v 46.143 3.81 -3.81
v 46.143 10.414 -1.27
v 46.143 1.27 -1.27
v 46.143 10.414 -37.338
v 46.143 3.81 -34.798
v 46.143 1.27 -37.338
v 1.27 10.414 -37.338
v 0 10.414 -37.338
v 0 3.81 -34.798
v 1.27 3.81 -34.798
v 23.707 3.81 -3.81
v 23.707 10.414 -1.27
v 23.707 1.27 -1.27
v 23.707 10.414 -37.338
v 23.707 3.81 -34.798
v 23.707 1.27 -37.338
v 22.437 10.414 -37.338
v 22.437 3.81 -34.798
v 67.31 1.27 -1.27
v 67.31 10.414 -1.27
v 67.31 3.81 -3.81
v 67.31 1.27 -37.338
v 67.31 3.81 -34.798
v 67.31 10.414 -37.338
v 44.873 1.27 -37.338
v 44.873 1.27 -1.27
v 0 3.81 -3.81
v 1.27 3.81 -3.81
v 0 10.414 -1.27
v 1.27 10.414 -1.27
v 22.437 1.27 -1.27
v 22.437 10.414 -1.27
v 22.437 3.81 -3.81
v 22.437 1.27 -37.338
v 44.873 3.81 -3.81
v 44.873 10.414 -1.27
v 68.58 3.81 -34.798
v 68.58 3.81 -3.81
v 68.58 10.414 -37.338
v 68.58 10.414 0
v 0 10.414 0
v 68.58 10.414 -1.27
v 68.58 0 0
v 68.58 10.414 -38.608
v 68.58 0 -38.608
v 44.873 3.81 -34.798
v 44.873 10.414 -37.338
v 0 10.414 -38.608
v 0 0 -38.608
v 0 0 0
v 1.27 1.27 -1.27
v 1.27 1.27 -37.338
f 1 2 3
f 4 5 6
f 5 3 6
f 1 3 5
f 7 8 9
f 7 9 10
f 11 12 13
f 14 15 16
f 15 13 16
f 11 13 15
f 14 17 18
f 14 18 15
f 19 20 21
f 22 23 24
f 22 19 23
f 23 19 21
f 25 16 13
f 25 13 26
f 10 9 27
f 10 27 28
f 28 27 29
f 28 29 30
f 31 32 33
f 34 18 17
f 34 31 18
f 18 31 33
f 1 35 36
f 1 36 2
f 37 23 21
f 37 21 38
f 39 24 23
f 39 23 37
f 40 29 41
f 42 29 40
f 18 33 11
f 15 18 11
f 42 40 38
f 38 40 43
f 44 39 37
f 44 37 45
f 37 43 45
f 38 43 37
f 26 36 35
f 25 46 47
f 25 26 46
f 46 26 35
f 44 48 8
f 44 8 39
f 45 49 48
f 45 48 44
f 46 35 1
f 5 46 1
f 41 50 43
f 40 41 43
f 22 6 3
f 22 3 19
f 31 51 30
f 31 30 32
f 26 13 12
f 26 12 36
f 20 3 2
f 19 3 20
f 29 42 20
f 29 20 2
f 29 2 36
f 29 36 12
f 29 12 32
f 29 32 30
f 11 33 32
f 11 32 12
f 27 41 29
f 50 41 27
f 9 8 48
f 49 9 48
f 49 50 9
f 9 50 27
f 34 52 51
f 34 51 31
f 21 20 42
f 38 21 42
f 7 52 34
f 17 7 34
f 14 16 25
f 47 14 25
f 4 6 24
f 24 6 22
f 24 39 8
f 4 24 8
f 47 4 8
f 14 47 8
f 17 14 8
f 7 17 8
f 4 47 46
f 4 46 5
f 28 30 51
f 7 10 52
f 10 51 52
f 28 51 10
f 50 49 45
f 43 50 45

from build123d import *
from OCP.BRepFilletAPI import BRepFilletAPI_MakeChamfer

# Parameters (mm, degrees)
SKETCH1_W           = 68.58
SKETCH1_H           = 38.608
BOSS_EXTRUDE1_DEPTH = 1.27
SKETCH2_W           = 68.58
SKETCH2_H           = 1.27
BOSS_EXTRUDE2_DEPTH = 9.144
SKETCH4_W           = 1.27
SKETCH4_H           = 36.068
BOSS_EXTRUDE4_DEPTH = 2.54
CHAMFER2_SIZE       = 6.604
CHAMFER2_SIZE_2     = 2.540000001


with BuildPart() as part:
    # Sketch1 → Boss-Extrude1 (new body)
    with BuildSketch(Plane(origin=(0, 0, 0), x_dir=(1, 0, 0), z_dir=(0, 1, 0))):
        with Locations((34.29, 19.304)):
            Rectangle(SKETCH1_W, SKETCH1_H)
    extrude(amount=BOSS_EXTRUDE1_DEPTH)

    # Sketch2 → Boss-Extrude2 (add)
    with BuildSketch(Plane(origin=(0, 1.27, 0), x_dir=(1, 0, 0), z_dir=(0, 1, 0))):
        with Locations((34.29, 37.973)):
            Rectangle(SKETCH2_W, SKETCH2_H)
        with Locations((34.29, 0.635)):
            Rectangle(SKETCH2_W, SKETCH2_H)
    extrude(amount=BOSS_EXTRUDE2_DEPTH)

    # Sketch4 → Boss-Extrude4 (add)
    with BuildSketch(Plane(origin=(0, 1.27, 0), x_dir=(1, 0, 0), z_dir=(0, 1, 0))):
        with Locations((0.635, 19.304)):
            Rectangle(SKETCH4_W, SKETCH4_H)
        with Locations((23.071666667, 19.304)):
            Rectangle(SKETCH4_W, SKETCH4_H)
        with Locations((45.508333333, 19.304)):
            Rectangle(SKETCH4_W, SKETCH4_H)
        with Locations((67.945, 19.304)):
            Rectangle(SKETCH4_W, SKETCH4_H)
    extrude(amount=BOSS_EXTRUDE4_DEPTH)

    # Chamfer2
    chamfer2_edges_1 = [part.edges().sort_by_distance(p)[0] for p in [
        (67.945, 3.81, -37.338),
    ]]
    chamfer2_side_1 = [part.faces().sort_by_distance(p)[0] for p in [
        (67.945, 3.8608, -37.338),
    ]]
    chamfer2_edges_2 = [part.edges().sort_by_distance(p)[0] for p in [
        (45.508333333, 3.81, -37.338),
    ]]
    chamfer2_side_2 = [part.faces().sort_by_distance(p)[0] for p in [
        (45.508333333, 3.8608, -37.338),
    ]]
    chamfer2_edges_3 = [part.edges().sort_by_distance(p)[0] for p in [
        (23.071666667, 3.81, -37.338),
    ]]
    chamfer2_side_3 = [part.faces().sort_by_distance(p)[0] for p in [
        (23.071666667, 3.8608, -37.338),
    ]]
    chamfer2_edges_4 = [part.edges().sort_by_distance(p)[0] for p in [
        (0.635, 3.81, -37.338),
    ]]
    chamfer2_side_4 = [part.faces().sort_by_distance(p)[0] for p in [
        (0.635, 3.8608, -37.338),
    ]]
    chamfer2_edges_5 = [part.edges().sort_by_distance(p)[0] for p in [
        (67.945, 3.81, -1.27),
    ]]
    chamfer2_side_5 = [part.faces().sort_by_distance(p)[0] for p in [
        (67.945, 3.8608, -1.27),
    ]]
    chamfer2_edges_6 = [part.edges().sort_by_distance(p)[0] for p in [
        (45.508333333, 3.81, -1.27),
    ]]
    chamfer2_side_6 = [part.faces().sort_by_distance(p)[0] for p in [
        (45.508333333, 3.8608, -1.27),
    ]]
    chamfer2_edges_7 = [part.edges().sort_by_distance(p)[0] for p in [
        (23.071666667, 3.81, -1.27),
    ]]
    chamfer2_side_7 = [part.faces().sort_by_distance(p)[0] for p in [
        (23.071666667, 3.8608, -1.27),
    ]]
    chamfer2_edges_8 = [part.edges().sort_by_distance(p)[0] for p in [
        (0.635, 3.81, -1.27),
    ]]
    chamfer2_side_8 = [part.faces().sort_by_distance(p)[0] for p in [
        (0.635, 3.8608, -1.27),
    ]]
    chamfer2 = BRepFilletAPI_MakeChamfer(part.part.solid().wrapped)
    for e in chamfer2_edges_1:
        chamfer2.Add(CHAMFER2_SIZE - 0.0001, CHAMFER2_SIZE_2 - 0.0001, e.wrapped, chamfer2_side_1[0].wrapped)
    for e in chamfer2_edges_2:
        chamfer2.Add(CHAMFER2_SIZE - 0.0001, CHAMFER2_SIZE_2 - 0.0001, e.wrapped, chamfer2_side_2[0].wrapped)
    for e in chamfer2_edges_3:
        chamfer2.Add(CHAMFER2_SIZE - 0.0001, CHAMFER2_SIZE_2 - 0.0001, e.wrapped, chamfer2_side_3[0].wrapped)
    for e in chamfer2_edges_4:
        chamfer2.Add(CHAMFER2_SIZE - 0.0001, CHAMFER2_SIZE_2 - 0.0001, e.wrapped, chamfer2_side_4[0].wrapped)
    for e in chamfer2_edges_5:
        chamfer2.Add(CHAMFER2_SIZE - 0.0001, CHAMFER2_SIZE_2 - 0.0001, e.wrapped, chamfer2_side_5[0].wrapped)
    for e in chamfer2_edges_6:
        chamfer2.Add(CHAMFER2_SIZE - 0.0001, CHAMFER2_SIZE_2 - 0.0001, e.wrapped, chamfer2_side_6[0].wrapped)
    for e in chamfer2_edges_7:
        chamfer2.Add(CHAMFER2_SIZE - 0.0001, CHAMFER2_SIZE_2 - 0.0001, e.wrapped, chamfer2_side_7[0].wrapped)
    for e in chamfer2_edges_8:
        chamfer2.Add(CHAMFER2_SIZE - 0.0001, CHAMFER2_SIZE_2 - 0.0001, e.wrapped, chamfer2_side_8[0].wrapped)
    add(Compound.cast(chamfer2.Shape()), mode=Mode.REPLACE)  # a hair under: the kernel refuses the full size


solid = part.part
